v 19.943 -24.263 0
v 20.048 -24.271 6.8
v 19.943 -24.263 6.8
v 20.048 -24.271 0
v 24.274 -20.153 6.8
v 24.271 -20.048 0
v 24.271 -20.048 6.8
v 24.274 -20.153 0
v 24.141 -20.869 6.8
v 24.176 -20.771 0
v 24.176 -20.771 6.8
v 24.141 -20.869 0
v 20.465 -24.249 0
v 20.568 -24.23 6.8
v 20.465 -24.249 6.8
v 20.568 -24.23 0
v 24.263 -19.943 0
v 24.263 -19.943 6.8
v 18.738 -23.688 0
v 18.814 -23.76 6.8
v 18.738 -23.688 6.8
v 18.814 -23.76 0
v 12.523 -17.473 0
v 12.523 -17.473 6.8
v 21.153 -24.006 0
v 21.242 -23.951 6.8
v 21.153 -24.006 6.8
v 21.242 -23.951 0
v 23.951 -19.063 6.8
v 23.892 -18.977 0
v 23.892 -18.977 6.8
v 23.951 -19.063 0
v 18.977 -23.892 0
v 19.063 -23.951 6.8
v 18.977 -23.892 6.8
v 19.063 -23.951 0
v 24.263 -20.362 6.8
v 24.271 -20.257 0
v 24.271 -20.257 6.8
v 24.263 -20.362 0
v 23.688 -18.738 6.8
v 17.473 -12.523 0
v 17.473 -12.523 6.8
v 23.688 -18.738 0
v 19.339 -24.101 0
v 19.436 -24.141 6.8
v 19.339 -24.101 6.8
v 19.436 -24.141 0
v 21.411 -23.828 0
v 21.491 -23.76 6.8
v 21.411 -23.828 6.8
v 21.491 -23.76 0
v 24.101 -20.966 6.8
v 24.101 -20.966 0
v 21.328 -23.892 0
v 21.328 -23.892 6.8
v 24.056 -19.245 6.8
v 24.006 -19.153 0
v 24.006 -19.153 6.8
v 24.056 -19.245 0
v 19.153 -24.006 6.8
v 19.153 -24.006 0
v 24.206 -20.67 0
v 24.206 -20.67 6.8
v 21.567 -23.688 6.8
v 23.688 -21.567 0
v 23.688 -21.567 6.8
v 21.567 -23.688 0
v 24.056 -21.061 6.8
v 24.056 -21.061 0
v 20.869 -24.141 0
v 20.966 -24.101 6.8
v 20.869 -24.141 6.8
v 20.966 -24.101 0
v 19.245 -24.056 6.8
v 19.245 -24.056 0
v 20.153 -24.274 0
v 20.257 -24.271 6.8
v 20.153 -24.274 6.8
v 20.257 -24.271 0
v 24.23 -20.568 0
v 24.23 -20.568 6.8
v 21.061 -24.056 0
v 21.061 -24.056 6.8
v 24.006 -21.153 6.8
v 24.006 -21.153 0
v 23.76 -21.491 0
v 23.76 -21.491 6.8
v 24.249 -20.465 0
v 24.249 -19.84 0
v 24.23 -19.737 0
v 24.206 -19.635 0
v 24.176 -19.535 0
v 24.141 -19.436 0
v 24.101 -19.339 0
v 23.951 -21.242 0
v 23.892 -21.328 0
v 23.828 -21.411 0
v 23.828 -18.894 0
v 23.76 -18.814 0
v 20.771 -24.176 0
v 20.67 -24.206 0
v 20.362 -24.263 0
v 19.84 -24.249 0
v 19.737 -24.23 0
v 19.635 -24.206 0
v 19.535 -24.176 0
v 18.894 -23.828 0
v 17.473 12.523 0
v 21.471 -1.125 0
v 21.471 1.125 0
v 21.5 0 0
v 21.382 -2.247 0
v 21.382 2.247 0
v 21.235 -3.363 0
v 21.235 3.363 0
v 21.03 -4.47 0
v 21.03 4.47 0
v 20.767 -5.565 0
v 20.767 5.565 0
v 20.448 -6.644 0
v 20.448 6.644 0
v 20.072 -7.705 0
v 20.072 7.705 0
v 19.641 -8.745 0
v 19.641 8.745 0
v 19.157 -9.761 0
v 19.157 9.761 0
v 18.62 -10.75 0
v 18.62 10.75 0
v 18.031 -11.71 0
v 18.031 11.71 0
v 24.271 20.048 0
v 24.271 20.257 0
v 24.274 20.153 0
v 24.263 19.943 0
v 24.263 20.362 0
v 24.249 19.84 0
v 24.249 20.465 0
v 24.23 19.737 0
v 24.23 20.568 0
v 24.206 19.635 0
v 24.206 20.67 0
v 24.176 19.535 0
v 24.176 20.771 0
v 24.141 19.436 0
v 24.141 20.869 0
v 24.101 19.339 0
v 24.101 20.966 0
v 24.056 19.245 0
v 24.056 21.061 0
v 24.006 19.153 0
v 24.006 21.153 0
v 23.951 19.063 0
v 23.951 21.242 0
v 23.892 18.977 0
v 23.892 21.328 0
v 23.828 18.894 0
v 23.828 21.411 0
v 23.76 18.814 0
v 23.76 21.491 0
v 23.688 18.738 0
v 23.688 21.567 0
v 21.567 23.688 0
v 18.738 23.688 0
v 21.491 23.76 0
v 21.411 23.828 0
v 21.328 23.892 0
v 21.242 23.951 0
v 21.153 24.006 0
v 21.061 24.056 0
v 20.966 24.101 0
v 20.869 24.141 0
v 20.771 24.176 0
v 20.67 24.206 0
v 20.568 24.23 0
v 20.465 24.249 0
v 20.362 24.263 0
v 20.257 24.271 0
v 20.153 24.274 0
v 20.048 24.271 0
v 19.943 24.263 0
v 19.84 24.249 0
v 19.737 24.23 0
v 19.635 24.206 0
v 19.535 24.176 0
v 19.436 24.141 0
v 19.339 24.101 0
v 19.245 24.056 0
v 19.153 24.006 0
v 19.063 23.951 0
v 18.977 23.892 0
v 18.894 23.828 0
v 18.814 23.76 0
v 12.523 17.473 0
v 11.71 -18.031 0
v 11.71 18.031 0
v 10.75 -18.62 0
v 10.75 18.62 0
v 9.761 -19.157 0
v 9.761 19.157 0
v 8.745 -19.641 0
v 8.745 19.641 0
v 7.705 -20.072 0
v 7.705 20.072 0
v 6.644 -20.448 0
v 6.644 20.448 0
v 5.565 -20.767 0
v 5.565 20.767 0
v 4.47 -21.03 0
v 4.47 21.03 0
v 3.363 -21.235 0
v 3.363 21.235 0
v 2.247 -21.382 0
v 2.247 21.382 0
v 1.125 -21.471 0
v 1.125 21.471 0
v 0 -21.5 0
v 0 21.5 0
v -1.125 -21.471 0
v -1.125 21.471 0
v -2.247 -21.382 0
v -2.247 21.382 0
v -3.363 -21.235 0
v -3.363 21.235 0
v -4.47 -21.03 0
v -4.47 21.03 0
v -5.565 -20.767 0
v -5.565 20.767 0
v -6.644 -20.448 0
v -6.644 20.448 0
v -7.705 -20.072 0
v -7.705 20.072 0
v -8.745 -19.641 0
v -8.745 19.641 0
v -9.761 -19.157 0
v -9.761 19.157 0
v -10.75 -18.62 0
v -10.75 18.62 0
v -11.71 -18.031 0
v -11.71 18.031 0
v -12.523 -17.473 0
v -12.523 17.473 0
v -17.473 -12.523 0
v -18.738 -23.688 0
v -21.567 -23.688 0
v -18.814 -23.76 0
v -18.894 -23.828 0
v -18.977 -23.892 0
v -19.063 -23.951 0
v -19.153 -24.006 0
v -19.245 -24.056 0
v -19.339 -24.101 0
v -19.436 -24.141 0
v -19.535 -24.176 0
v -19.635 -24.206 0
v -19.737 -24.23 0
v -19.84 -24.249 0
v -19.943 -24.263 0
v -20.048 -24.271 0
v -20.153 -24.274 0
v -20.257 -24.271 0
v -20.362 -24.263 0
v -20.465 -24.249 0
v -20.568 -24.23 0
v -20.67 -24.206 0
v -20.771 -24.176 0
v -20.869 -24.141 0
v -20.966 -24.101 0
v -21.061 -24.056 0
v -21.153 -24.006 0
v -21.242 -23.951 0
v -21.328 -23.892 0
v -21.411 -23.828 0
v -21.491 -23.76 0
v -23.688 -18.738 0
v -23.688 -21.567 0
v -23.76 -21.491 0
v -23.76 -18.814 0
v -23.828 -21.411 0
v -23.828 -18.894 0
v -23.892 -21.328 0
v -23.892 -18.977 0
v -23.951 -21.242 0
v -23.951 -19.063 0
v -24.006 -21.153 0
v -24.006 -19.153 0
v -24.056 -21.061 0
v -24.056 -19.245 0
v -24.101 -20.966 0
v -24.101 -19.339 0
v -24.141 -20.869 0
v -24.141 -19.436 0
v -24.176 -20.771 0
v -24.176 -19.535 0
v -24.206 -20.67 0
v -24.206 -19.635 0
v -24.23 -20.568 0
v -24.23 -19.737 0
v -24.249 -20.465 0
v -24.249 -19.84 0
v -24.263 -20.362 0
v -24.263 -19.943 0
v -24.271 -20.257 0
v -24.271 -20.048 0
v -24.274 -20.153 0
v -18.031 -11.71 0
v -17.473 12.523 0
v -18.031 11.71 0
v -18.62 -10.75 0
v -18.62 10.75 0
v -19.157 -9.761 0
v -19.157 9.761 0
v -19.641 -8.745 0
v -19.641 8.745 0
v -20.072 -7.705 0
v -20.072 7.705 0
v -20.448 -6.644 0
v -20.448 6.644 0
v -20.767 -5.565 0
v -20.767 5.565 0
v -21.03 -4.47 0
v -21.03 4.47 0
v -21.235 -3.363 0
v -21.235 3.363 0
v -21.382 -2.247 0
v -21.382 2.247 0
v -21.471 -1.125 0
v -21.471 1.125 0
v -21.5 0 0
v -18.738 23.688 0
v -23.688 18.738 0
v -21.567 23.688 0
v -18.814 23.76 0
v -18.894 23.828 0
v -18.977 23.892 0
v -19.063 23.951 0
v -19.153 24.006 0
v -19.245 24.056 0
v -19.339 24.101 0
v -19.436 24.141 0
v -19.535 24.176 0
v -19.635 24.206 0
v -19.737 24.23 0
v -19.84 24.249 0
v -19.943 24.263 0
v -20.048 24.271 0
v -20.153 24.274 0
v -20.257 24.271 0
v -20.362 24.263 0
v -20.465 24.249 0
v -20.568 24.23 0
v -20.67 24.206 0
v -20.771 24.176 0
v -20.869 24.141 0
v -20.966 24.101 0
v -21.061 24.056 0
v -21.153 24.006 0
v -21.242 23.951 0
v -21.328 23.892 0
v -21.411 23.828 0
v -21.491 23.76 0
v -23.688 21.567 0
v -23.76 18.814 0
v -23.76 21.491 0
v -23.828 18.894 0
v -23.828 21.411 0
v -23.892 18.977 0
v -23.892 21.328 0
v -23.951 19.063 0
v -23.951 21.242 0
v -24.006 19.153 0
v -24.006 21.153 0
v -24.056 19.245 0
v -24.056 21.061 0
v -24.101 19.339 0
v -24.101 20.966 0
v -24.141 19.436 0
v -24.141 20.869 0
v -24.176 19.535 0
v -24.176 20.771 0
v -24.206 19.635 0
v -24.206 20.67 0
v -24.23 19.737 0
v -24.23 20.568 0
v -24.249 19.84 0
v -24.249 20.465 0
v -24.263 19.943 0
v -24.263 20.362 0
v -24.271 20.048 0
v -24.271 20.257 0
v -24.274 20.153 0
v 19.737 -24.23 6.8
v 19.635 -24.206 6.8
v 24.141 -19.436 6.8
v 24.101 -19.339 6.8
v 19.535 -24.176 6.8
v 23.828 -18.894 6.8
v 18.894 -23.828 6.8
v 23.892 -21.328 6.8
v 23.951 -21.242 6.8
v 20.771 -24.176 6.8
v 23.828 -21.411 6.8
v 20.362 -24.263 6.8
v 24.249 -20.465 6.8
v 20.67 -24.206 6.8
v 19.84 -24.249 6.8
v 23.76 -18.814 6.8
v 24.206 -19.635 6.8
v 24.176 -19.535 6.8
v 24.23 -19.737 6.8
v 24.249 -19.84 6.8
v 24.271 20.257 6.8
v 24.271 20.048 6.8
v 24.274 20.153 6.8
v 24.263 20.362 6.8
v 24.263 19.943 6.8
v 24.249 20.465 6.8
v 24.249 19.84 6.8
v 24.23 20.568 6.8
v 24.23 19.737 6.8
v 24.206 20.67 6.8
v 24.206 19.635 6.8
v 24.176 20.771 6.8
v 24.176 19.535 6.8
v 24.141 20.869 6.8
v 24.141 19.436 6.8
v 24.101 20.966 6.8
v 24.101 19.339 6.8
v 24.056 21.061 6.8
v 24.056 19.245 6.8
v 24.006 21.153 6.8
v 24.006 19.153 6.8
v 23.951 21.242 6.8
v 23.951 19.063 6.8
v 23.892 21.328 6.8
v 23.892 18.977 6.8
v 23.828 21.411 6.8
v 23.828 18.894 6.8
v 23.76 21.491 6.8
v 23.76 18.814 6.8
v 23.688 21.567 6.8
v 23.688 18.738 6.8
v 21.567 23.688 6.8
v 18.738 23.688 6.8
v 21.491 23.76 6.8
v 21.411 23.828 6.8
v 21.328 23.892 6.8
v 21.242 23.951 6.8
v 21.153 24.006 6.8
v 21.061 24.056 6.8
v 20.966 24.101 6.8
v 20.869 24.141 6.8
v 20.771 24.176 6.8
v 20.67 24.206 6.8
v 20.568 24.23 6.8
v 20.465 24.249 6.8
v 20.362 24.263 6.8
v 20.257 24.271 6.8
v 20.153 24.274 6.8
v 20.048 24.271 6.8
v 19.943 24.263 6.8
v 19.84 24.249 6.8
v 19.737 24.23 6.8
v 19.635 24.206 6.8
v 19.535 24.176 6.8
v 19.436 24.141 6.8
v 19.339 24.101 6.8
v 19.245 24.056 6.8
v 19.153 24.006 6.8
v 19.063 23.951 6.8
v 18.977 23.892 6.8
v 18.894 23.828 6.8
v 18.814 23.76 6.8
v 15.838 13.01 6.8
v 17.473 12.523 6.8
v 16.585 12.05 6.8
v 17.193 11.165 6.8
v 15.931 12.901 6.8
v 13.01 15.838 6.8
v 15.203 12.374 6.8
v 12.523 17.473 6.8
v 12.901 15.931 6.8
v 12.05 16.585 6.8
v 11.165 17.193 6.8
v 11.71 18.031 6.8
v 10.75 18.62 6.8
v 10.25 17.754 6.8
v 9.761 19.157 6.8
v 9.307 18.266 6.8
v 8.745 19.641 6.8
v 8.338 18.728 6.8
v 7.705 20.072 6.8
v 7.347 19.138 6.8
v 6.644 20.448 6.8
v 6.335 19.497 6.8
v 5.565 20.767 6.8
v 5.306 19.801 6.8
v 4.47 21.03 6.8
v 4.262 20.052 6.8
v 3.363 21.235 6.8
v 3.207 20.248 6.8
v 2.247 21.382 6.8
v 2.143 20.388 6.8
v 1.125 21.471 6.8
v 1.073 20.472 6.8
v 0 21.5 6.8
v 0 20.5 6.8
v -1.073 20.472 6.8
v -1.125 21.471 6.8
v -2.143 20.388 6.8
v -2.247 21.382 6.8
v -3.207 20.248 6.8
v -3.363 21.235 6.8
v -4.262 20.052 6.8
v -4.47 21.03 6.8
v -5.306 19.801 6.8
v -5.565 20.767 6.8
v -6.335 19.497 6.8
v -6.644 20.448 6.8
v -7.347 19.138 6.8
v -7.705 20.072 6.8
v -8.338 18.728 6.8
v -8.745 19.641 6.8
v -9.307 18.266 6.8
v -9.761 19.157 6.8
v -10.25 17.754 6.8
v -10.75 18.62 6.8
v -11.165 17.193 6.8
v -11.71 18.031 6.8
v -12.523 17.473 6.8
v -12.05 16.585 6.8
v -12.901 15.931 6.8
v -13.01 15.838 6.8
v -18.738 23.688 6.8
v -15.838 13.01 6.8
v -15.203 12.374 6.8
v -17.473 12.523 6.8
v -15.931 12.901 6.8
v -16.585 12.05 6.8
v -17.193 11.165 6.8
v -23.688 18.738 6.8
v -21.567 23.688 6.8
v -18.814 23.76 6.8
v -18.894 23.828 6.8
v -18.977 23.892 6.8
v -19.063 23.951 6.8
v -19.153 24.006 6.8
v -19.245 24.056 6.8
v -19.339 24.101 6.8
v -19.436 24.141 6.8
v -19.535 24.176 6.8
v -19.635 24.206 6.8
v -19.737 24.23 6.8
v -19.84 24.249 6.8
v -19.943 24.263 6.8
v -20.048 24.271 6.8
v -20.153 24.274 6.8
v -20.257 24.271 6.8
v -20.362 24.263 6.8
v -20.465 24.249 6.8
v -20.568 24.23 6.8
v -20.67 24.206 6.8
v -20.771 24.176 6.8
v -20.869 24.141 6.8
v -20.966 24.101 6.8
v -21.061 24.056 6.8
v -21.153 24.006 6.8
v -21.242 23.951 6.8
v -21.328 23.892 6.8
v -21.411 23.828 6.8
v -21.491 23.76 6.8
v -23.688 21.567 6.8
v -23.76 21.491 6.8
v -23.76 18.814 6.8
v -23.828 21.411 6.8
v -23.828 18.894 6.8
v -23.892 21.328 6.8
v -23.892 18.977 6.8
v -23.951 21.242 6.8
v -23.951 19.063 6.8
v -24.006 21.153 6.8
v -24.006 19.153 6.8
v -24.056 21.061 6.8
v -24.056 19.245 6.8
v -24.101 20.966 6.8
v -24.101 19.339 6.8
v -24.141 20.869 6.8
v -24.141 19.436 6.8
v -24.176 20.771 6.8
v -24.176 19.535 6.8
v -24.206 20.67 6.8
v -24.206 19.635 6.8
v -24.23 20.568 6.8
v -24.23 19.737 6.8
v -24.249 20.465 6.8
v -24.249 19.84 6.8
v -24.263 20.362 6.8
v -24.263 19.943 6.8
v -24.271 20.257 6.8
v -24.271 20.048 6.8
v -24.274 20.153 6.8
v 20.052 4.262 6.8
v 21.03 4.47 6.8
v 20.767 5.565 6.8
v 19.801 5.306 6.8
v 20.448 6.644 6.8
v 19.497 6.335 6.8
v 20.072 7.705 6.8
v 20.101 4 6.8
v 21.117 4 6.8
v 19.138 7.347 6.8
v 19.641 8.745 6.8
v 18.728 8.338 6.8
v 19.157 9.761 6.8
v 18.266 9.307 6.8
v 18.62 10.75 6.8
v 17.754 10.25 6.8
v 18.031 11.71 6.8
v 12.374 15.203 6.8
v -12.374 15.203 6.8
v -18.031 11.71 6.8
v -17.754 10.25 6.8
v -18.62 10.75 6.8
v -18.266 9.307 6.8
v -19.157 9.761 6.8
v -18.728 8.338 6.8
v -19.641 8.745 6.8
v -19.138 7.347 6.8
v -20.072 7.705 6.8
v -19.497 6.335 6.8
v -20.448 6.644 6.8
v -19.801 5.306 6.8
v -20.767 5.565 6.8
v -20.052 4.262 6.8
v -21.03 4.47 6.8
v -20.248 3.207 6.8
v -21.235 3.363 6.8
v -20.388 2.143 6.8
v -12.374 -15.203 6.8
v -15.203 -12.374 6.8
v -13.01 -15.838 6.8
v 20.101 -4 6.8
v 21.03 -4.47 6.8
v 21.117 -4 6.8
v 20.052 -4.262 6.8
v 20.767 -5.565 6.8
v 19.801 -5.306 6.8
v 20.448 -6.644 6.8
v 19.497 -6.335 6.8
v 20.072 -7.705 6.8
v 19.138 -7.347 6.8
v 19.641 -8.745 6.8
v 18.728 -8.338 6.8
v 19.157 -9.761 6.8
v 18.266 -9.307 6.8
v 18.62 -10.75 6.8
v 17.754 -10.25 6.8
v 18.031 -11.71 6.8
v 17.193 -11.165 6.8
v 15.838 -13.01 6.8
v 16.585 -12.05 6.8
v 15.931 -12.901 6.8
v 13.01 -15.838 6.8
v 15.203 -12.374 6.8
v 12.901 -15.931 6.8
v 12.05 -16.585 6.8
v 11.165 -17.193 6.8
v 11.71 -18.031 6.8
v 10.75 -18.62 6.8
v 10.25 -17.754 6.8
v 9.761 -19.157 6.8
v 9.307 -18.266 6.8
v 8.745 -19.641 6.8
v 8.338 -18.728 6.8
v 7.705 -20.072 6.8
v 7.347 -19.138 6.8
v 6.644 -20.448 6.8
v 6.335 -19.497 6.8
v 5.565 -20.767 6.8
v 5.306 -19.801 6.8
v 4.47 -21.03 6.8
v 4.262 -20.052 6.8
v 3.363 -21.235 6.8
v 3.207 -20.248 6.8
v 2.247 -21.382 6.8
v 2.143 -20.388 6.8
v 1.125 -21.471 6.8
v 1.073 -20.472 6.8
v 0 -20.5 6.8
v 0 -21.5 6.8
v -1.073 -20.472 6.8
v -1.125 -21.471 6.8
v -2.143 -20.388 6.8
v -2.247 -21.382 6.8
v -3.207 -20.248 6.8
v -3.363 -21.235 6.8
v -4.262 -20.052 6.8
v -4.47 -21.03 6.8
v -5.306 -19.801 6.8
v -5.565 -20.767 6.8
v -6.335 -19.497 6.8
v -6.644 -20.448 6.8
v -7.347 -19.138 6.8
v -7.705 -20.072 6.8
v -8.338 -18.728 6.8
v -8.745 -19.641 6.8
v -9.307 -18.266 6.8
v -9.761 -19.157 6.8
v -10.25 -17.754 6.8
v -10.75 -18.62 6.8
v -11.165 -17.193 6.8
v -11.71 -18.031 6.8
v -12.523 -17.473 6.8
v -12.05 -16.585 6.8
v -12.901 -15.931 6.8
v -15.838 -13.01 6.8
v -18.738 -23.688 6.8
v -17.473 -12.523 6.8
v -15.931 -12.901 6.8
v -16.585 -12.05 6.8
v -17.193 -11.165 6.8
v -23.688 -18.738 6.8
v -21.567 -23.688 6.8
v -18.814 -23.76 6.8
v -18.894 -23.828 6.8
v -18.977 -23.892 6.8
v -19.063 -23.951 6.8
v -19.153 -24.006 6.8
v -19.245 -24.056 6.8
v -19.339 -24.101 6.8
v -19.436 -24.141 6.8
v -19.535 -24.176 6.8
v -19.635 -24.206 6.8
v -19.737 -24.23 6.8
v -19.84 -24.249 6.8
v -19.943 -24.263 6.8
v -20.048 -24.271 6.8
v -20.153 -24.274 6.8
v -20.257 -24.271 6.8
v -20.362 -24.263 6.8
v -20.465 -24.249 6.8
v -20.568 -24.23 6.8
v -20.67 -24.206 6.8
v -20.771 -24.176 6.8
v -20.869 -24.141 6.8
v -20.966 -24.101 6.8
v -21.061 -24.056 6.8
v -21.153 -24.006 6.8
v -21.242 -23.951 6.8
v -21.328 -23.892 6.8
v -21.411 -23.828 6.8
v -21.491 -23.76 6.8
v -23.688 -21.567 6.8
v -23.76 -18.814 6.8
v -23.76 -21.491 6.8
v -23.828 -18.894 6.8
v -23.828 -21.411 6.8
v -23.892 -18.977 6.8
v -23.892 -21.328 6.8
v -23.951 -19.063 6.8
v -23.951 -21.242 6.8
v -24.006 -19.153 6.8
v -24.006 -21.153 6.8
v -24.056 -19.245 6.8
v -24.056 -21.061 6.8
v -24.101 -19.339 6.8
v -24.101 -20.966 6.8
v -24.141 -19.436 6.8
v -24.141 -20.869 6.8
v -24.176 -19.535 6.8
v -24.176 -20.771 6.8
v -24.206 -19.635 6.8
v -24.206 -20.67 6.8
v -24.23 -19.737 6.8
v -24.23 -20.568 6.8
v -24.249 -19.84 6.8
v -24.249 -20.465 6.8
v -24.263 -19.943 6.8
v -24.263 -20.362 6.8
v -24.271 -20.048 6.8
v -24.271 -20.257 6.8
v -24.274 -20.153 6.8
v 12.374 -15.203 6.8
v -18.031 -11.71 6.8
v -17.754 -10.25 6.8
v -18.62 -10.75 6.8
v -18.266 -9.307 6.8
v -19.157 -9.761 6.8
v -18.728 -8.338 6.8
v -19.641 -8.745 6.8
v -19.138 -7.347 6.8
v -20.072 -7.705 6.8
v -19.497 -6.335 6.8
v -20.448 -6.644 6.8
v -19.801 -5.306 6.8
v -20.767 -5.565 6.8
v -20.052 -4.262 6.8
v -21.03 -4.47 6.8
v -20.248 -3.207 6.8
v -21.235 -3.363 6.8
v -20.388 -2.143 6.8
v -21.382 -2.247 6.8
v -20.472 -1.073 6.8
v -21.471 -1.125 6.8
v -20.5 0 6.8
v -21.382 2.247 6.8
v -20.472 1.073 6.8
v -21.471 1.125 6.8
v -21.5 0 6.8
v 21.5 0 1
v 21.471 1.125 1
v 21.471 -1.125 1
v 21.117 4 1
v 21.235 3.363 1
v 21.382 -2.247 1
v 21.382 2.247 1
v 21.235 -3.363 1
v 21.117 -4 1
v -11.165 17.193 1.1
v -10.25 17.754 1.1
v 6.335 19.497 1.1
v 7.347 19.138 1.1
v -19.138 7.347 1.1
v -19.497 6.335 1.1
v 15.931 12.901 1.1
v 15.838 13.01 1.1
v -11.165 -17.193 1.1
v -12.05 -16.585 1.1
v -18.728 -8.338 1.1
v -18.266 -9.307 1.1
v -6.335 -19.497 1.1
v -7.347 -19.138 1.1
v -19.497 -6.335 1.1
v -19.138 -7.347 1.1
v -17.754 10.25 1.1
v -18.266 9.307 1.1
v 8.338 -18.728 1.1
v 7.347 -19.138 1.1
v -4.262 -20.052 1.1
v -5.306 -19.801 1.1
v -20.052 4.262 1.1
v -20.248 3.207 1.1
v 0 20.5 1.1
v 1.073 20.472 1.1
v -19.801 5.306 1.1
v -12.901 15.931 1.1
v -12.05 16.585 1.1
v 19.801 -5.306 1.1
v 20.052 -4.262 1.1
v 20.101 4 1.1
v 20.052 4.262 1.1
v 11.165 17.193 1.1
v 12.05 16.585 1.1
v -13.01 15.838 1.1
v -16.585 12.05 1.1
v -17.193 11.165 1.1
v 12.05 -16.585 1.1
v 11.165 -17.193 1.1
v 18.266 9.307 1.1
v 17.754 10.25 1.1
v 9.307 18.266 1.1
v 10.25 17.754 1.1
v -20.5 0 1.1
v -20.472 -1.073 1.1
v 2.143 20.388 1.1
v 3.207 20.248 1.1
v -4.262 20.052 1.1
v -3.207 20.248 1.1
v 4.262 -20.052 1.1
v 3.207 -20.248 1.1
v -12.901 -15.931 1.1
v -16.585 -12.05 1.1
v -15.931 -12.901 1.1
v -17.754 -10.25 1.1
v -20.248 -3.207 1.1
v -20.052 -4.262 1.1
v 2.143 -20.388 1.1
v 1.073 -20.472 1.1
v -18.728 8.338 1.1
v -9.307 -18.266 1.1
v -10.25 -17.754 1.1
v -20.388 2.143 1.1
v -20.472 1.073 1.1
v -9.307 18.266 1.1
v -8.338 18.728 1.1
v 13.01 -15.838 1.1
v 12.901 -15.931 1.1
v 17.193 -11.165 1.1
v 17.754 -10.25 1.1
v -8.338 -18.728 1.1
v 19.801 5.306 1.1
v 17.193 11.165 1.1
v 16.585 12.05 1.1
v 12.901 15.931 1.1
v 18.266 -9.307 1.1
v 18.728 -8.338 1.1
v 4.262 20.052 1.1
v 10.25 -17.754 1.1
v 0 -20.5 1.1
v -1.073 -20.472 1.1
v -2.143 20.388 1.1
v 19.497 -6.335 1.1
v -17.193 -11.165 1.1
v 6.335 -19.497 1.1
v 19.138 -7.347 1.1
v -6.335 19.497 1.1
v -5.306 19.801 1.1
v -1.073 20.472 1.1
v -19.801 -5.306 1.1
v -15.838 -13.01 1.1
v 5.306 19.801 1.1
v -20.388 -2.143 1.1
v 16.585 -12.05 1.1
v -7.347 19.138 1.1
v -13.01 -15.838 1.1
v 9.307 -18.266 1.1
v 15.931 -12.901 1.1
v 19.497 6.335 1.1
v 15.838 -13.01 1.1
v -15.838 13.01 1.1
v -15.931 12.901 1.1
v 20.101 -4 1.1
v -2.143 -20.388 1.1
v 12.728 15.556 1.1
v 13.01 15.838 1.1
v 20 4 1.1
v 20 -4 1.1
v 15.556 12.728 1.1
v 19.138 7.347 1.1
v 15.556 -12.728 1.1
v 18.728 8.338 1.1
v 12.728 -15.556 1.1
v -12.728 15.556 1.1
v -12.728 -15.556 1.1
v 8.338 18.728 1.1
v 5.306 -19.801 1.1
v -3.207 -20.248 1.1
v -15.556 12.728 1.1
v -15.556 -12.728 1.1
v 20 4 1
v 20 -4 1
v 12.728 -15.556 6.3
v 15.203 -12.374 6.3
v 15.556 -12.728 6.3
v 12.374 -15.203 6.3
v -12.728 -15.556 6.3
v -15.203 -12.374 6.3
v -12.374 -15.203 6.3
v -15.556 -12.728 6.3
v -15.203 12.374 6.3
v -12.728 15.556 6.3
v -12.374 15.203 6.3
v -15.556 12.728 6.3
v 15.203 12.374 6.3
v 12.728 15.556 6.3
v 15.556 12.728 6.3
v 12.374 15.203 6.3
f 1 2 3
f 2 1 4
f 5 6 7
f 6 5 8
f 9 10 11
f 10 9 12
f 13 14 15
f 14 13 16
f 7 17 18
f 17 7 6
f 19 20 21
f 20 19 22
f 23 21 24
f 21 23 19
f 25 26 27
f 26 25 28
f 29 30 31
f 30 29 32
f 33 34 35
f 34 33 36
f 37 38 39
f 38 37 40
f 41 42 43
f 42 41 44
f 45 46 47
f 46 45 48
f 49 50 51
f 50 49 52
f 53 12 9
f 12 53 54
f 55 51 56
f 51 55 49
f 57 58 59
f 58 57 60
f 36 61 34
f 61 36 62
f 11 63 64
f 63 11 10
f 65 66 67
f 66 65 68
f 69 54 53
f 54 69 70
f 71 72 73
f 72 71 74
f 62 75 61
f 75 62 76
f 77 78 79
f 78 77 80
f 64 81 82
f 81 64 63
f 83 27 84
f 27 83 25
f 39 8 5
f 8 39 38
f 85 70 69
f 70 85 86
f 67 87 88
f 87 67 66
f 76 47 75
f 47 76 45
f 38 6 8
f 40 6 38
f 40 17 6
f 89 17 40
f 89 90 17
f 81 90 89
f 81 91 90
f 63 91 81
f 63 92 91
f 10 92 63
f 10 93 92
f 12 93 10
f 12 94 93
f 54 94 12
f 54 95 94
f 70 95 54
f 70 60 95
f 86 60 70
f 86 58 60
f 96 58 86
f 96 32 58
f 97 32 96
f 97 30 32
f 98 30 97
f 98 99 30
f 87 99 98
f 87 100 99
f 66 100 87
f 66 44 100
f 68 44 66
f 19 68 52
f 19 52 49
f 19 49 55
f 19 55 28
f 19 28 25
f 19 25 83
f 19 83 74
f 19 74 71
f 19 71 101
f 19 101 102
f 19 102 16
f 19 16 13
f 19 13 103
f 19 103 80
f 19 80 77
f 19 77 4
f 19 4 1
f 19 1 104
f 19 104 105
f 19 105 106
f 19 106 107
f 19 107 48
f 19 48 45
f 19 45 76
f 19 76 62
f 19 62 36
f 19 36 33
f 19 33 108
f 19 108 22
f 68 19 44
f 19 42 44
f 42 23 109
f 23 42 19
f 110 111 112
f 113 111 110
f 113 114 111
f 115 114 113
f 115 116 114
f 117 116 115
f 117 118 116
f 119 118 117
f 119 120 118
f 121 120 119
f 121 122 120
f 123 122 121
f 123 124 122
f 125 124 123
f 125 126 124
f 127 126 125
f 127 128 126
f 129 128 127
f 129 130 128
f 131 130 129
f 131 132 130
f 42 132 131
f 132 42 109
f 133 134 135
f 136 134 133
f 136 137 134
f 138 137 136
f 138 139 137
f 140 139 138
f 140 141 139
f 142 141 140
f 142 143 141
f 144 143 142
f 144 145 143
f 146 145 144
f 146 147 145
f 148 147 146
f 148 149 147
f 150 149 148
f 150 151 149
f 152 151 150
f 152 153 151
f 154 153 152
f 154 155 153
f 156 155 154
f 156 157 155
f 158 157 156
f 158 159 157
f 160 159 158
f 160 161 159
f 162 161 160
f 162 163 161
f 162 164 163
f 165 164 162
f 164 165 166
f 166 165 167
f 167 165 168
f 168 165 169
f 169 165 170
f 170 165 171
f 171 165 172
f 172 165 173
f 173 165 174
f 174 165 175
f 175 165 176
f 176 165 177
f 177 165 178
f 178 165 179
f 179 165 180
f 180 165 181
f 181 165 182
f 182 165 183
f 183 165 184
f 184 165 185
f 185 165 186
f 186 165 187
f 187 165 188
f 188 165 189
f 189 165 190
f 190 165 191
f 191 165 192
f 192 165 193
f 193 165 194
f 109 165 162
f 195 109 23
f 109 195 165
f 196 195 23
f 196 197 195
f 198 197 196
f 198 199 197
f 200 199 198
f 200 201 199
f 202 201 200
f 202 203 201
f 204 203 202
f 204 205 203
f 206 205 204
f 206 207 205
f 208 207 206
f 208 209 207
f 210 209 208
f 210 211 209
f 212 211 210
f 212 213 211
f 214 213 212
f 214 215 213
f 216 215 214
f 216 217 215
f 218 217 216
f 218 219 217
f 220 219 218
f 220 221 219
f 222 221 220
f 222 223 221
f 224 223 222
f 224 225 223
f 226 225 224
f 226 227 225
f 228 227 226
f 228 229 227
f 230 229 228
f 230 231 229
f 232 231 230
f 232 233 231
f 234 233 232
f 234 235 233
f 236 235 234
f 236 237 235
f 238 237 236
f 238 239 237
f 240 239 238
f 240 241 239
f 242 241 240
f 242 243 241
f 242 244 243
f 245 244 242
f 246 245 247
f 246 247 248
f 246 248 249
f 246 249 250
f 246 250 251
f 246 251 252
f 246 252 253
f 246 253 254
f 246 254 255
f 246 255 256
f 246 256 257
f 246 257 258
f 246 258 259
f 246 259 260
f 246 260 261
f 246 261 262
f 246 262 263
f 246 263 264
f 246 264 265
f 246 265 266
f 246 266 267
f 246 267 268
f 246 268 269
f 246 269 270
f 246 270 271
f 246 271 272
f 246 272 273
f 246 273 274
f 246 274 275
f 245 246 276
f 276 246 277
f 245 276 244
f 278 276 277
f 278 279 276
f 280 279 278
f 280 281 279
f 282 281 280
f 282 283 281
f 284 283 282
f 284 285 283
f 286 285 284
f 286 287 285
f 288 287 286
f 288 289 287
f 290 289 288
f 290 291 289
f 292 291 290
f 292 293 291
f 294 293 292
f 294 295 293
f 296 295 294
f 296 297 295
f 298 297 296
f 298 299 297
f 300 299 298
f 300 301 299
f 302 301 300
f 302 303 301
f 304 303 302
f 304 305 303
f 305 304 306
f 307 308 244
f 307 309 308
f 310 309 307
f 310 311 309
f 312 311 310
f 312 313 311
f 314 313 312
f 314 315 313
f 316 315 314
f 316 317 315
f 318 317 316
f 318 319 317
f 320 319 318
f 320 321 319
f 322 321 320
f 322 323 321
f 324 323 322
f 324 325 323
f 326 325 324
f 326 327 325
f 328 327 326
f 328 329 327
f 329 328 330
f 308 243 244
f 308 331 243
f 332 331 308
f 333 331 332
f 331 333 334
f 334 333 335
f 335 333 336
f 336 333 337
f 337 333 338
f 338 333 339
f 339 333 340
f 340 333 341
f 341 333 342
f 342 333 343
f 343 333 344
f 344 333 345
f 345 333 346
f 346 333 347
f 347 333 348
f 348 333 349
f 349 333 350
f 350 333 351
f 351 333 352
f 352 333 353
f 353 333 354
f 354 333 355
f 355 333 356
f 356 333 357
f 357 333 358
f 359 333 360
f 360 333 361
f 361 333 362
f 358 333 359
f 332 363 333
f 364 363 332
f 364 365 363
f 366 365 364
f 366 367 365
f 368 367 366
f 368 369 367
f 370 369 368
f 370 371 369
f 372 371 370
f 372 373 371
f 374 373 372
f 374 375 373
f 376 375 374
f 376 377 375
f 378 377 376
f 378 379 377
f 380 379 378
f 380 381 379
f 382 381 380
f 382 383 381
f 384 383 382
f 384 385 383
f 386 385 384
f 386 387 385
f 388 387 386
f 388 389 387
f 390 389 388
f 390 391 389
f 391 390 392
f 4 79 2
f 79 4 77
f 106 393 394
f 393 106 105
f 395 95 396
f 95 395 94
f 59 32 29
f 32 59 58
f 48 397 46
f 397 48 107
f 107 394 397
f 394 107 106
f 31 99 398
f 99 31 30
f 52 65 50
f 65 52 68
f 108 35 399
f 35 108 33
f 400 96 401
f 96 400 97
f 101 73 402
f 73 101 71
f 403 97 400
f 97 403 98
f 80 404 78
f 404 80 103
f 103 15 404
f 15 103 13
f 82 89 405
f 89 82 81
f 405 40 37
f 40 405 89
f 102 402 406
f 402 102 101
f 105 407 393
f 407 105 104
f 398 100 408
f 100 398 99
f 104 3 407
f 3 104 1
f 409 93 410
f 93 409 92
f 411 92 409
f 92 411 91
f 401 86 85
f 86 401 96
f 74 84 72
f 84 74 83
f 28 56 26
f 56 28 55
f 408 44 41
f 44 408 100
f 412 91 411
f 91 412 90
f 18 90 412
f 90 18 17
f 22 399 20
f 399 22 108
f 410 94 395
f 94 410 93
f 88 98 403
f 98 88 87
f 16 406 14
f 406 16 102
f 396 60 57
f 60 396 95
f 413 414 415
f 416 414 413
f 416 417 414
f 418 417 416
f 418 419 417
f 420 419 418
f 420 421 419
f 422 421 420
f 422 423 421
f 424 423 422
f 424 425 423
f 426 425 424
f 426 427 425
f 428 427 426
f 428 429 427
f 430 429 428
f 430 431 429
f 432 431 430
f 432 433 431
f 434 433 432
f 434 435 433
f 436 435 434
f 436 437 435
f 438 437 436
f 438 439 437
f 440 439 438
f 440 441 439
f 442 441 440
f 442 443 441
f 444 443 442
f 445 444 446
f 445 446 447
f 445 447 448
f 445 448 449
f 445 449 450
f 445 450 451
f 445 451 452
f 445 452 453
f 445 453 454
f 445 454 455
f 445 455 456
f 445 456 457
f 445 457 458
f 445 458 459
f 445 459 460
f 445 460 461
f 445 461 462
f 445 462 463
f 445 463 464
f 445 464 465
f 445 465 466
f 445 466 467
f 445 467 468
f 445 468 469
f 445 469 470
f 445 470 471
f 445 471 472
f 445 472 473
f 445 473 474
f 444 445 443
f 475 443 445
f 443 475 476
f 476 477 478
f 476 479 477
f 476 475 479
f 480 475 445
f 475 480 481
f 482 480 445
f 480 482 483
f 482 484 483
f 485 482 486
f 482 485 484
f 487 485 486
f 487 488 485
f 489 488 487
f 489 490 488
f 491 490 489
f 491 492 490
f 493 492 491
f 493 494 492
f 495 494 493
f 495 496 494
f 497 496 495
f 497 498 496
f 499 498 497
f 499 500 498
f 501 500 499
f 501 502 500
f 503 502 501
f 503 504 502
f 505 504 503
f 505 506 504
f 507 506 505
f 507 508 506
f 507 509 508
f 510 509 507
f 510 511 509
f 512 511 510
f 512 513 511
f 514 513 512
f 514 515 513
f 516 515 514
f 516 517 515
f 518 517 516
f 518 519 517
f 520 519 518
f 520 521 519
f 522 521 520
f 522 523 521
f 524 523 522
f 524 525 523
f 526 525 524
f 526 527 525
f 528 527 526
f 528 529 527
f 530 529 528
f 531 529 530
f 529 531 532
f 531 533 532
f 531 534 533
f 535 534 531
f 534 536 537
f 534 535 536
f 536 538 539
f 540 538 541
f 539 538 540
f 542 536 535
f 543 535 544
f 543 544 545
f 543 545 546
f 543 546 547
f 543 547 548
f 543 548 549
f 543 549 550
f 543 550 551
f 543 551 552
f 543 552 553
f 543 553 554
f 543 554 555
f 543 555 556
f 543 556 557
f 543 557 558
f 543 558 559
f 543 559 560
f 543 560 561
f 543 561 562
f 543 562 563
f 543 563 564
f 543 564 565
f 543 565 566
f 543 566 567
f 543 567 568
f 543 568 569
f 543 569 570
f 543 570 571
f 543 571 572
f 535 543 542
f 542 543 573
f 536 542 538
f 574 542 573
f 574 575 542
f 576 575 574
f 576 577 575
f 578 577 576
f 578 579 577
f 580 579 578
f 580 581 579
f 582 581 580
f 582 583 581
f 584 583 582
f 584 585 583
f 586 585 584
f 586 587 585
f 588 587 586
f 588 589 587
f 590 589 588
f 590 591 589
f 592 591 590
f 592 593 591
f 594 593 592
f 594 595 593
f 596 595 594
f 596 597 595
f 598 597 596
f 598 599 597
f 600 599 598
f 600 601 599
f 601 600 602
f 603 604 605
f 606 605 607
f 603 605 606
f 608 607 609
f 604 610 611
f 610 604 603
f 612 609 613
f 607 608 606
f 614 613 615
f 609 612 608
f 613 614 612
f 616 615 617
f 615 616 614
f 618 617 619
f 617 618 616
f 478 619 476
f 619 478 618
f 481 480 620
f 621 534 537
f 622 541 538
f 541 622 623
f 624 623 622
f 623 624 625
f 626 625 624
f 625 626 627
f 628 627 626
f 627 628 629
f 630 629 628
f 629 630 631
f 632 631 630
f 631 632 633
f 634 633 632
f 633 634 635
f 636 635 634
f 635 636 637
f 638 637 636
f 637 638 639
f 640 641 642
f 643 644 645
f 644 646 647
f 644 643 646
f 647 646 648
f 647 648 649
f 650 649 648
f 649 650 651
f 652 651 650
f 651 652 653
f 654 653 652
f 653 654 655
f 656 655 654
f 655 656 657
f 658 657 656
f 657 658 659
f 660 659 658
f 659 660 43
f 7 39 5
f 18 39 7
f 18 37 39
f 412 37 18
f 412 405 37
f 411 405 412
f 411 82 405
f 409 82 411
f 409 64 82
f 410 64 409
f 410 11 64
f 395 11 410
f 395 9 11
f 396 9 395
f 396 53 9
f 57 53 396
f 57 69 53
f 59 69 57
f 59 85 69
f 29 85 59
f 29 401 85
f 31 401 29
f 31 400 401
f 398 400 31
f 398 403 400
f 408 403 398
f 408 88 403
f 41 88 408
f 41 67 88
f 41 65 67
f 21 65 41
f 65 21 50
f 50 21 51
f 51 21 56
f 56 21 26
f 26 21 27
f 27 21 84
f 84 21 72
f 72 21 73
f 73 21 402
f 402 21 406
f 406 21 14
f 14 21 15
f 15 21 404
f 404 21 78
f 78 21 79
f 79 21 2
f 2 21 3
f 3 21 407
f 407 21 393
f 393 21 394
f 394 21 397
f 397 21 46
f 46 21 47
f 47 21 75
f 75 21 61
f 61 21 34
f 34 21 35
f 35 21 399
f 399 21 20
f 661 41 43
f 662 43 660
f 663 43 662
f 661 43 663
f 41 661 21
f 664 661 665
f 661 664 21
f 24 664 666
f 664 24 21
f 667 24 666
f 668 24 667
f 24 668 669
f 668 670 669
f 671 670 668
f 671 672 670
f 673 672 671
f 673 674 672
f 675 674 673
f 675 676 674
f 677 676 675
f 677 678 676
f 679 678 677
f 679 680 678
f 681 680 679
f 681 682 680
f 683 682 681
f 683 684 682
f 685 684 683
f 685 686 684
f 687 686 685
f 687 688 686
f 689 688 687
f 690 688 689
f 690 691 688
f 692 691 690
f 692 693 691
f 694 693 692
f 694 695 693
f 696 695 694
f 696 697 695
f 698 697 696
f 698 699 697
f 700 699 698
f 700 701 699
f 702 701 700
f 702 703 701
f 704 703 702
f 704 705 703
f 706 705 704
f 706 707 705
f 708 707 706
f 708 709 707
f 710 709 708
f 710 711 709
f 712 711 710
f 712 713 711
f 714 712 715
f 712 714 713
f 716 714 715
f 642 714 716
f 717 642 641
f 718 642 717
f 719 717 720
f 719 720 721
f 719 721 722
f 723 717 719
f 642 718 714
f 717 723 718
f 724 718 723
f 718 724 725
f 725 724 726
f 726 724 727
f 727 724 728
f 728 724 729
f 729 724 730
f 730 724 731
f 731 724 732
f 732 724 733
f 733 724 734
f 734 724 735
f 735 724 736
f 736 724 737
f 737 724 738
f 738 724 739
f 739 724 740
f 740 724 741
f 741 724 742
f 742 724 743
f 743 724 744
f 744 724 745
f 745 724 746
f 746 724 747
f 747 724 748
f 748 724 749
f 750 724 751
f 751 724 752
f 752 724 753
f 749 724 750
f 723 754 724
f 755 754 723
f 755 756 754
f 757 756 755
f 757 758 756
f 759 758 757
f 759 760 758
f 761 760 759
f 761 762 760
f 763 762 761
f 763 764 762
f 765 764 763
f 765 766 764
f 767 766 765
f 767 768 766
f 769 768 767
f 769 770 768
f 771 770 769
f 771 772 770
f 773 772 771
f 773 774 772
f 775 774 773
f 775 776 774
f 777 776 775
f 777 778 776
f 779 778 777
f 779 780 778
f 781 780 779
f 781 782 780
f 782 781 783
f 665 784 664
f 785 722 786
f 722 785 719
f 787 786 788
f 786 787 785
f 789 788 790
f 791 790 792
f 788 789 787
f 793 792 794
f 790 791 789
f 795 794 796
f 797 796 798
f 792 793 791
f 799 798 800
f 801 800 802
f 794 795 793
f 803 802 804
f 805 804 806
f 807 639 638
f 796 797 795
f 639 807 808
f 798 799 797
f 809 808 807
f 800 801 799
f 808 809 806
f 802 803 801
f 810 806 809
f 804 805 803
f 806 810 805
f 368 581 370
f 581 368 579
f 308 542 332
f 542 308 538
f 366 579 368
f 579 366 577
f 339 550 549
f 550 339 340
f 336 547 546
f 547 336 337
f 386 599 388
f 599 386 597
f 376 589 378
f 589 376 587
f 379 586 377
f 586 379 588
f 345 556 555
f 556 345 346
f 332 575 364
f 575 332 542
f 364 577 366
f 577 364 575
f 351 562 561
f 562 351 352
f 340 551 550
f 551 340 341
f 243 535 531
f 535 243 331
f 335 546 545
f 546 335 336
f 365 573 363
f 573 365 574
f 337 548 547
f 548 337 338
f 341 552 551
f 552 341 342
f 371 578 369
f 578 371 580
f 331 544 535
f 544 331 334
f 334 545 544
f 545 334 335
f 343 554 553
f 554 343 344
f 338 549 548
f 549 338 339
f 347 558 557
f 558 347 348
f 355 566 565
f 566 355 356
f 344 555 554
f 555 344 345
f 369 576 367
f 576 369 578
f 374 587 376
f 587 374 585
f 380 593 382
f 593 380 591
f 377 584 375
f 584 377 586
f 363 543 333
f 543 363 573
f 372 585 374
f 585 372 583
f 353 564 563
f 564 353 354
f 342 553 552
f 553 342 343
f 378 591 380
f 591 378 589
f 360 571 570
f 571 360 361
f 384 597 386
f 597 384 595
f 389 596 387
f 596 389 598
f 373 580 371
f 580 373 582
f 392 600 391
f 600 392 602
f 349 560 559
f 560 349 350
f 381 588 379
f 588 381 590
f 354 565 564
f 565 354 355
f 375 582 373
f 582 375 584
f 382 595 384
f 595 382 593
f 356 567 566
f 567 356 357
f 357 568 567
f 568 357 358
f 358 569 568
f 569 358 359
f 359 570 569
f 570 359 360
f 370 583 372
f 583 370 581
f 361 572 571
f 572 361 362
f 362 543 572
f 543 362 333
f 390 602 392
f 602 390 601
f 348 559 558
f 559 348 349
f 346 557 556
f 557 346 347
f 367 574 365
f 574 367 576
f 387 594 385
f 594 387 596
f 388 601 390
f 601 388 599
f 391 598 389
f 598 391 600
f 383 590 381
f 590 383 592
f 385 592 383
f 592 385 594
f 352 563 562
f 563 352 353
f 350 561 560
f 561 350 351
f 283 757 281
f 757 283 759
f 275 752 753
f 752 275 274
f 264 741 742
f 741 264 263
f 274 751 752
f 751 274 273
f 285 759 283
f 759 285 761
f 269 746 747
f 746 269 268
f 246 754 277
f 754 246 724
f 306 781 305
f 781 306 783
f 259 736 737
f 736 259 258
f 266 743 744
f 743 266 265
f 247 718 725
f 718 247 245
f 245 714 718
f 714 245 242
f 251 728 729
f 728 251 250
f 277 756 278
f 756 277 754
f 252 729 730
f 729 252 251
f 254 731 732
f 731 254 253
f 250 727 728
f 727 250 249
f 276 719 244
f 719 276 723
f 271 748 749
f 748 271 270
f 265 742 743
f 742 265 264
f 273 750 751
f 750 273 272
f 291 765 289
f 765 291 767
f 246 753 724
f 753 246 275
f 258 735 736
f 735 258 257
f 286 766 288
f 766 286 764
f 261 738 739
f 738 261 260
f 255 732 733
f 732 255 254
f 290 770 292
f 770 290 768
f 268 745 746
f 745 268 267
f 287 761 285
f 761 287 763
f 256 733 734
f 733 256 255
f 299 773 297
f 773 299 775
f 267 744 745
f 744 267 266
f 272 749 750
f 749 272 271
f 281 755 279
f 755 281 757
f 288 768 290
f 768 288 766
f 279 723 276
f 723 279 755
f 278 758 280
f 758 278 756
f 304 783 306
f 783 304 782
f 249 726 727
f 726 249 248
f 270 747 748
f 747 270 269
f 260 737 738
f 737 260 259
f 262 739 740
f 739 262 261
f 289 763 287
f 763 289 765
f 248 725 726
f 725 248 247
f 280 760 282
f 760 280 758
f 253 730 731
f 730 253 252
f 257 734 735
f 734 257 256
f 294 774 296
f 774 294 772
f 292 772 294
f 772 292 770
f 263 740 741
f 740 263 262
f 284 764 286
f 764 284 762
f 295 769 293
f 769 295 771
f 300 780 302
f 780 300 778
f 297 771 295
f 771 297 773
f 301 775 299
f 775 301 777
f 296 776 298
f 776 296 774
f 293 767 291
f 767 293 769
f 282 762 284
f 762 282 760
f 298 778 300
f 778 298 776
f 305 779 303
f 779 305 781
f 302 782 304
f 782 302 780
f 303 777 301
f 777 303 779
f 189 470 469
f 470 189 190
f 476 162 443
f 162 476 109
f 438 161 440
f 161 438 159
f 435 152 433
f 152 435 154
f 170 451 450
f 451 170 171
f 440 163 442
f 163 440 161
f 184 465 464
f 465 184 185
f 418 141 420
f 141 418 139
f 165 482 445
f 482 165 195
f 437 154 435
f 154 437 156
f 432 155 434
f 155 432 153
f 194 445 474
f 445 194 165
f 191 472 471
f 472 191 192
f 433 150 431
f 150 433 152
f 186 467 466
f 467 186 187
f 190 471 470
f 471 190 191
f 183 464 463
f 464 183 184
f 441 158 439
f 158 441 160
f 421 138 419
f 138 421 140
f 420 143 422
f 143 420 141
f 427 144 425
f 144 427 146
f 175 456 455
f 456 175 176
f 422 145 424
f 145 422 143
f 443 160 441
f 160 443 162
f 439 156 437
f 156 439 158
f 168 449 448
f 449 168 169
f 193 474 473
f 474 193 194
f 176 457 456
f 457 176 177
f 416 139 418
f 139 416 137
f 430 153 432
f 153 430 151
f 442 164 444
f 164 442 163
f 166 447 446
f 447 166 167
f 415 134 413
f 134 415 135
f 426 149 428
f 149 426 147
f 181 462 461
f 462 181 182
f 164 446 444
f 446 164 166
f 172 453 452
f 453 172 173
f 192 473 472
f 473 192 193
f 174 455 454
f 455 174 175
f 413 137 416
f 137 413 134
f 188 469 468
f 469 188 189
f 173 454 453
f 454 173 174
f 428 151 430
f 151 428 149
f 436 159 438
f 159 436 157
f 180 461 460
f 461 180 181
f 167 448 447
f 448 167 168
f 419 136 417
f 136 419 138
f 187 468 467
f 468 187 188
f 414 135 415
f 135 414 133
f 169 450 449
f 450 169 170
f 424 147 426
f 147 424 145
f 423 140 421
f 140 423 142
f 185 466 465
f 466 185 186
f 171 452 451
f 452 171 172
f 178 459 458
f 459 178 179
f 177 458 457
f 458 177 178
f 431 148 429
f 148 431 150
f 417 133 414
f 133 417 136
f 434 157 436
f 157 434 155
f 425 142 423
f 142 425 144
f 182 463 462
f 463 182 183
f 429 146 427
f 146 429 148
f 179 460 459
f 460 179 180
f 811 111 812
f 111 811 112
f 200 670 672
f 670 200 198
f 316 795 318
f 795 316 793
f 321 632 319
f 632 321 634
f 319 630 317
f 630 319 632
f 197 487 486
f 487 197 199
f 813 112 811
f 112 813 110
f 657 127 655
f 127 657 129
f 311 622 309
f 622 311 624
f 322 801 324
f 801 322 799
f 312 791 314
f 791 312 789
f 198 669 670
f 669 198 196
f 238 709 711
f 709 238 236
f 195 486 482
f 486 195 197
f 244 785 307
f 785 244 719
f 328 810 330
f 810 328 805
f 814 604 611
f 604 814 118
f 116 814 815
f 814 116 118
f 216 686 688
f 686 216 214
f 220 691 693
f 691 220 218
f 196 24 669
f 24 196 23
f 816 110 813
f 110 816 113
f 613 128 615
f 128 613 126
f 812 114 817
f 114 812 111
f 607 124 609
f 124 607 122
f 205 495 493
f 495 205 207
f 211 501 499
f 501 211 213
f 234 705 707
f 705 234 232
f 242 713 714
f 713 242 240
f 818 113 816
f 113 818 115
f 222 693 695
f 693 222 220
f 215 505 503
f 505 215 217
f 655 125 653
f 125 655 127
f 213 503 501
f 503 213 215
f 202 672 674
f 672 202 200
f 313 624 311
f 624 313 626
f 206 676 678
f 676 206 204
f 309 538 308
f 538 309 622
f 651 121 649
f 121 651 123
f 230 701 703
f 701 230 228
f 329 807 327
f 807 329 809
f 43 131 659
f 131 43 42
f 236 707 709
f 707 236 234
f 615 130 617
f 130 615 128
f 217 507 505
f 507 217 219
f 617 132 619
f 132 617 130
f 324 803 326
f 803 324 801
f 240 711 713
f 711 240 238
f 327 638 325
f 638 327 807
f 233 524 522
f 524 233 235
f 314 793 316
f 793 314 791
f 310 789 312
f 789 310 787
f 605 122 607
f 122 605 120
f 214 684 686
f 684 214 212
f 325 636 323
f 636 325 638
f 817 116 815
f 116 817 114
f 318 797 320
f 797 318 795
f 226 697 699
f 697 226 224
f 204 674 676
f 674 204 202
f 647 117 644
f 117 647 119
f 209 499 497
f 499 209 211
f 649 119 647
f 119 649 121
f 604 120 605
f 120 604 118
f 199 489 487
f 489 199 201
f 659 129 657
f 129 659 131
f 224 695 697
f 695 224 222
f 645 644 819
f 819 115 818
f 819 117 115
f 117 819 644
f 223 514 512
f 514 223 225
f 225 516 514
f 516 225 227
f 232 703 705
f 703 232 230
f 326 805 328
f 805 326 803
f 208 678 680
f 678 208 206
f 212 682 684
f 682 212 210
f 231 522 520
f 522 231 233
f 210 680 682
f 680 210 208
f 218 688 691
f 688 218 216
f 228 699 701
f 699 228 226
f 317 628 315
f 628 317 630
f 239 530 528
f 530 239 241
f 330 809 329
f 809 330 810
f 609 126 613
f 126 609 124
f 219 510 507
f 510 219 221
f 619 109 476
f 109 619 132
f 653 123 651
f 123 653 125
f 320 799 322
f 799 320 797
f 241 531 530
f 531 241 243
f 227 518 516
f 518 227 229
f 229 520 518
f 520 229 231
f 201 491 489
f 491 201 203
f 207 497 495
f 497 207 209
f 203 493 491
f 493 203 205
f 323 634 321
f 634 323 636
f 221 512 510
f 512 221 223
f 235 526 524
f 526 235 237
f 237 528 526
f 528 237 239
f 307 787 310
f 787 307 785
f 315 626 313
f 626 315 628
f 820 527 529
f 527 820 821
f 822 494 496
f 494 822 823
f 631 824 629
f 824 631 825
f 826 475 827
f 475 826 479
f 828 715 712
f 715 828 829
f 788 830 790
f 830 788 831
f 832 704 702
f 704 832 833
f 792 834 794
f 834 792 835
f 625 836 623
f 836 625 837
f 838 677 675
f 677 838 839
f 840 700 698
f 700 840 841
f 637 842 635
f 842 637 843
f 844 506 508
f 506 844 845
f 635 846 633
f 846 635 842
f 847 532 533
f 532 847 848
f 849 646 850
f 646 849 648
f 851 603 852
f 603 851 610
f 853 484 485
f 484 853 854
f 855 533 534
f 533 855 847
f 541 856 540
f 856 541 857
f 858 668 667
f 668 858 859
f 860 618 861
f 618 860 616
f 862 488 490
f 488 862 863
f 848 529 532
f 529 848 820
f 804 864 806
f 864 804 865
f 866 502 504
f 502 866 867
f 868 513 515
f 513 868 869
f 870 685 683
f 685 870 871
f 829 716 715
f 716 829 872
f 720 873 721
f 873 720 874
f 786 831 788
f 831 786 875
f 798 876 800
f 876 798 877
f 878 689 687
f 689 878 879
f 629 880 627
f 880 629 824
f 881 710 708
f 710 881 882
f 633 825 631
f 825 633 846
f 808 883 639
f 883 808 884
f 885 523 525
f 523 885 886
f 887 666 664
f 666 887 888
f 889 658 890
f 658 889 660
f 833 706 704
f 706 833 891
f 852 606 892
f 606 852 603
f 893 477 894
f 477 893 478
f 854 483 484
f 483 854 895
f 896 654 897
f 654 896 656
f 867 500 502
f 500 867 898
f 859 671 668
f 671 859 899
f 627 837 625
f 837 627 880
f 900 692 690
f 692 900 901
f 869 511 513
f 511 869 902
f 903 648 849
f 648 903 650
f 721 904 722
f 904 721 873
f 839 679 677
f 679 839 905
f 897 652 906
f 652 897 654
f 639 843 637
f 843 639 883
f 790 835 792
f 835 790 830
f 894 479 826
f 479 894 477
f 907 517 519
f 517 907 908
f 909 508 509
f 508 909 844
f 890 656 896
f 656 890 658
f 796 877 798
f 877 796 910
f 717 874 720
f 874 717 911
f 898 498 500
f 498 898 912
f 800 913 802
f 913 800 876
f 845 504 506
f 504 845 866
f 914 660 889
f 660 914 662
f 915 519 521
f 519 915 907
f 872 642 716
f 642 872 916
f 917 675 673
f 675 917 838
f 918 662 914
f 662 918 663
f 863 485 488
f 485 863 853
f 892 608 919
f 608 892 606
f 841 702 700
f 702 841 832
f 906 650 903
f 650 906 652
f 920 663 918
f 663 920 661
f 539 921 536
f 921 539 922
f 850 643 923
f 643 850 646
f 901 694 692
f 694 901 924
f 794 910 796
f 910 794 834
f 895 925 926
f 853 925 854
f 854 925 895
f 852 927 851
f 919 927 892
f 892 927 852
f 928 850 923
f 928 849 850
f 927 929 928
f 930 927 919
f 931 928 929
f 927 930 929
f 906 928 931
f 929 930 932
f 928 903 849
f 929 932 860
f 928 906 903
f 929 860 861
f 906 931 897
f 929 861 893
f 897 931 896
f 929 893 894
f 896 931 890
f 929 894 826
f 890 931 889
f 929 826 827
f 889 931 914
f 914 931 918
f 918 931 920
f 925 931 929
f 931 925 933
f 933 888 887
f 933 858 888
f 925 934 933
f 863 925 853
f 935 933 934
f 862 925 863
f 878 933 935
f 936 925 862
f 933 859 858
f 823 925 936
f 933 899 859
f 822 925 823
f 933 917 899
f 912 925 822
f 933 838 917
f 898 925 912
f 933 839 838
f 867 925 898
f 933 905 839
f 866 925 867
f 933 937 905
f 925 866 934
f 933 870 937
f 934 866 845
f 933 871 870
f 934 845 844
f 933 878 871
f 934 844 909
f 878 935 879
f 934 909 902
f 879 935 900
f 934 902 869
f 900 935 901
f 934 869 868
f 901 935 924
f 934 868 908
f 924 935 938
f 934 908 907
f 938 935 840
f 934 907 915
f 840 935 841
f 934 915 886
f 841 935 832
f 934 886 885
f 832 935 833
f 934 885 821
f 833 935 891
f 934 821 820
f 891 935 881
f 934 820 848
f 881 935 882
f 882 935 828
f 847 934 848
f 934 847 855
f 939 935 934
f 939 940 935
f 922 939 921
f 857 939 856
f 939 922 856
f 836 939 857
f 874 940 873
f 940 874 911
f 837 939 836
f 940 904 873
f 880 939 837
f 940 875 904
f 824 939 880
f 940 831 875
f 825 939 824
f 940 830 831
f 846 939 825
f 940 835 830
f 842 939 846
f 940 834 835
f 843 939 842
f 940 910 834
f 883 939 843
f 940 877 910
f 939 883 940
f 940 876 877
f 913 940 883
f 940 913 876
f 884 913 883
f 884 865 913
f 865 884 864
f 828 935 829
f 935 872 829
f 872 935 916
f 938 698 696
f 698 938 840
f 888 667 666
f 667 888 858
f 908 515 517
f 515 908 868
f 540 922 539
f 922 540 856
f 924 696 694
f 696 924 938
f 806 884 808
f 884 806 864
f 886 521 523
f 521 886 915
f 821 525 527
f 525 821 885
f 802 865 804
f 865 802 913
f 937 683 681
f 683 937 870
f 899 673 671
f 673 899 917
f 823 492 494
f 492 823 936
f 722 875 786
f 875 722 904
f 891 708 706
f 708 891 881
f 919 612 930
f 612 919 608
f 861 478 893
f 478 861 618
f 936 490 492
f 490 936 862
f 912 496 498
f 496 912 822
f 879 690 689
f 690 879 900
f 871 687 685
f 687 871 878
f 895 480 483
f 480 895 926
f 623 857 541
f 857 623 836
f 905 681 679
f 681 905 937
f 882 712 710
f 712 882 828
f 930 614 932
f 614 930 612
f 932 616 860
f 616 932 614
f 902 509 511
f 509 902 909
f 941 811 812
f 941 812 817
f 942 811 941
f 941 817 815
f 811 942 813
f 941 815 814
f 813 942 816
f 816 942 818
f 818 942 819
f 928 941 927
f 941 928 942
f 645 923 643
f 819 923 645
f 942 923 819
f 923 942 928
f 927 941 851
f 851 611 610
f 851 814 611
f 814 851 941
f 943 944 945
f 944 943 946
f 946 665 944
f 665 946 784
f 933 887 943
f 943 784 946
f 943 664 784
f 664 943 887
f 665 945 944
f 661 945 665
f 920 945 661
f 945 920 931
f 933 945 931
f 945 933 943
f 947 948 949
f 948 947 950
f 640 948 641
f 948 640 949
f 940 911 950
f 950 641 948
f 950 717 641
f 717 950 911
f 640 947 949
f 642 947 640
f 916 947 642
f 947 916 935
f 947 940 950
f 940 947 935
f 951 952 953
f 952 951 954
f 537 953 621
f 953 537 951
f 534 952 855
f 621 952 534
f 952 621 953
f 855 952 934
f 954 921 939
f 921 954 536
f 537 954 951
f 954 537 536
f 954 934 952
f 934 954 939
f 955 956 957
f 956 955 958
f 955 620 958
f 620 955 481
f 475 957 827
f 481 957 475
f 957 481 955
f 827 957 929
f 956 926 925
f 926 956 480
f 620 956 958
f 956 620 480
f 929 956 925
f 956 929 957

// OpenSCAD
// Copyright 2015 Steve Pomeroy
// Licensed under the CC-BY-SA 4.0 License
// http://creativecommons.org/licenses/by-sa/4.0/

//////////////////////////////////////////////////////////////////////
/////////////////////// Configuration Options ////////////////////////
//////////////////////////////////////////////////////////////////////
// tidy up the curves
$fn=120;
$fs=0.5;

// measured dimensions of the pebblebee
pebblebee=[40,40,5.8];

// wall thickness
wall=1;

// radius of the crossbars
curve_r=2;

// the crossbars to wind your cord around
bar=[3,60,pebblebee[2]];

// the bit that touches the actual pebblebee
spacer=[0.5,4,pebblebee[2]];

// A small clip above the spacer to hold the pebblebee in
clip=[0.5 + spacer[0],4,0.5];

// hole for accessing the button
button=8;

//////////////////////////////////////////////////////////////////////
//////////////////////////////////////////////////////////////////////

translate([0,0,pebblebee[2]+wall])
  rotate([180,0,0]) {
    difference(){
      union() {
        minkowski(){

        union(){
        rotate([0,0,-45])
            translate([-bar[0]/2,-bar[1]/2,0])
                cube(bar);

        rotate([0,0,45])
            translate([-bar[0]/2,-bar[1]/2,0])
                cube(bar);
        }

        cylinder(r=curve_r,h=wall);
        }

        cylinder(r=pebblebee[0]/2+wall+spacer[0],h=pebblebee[2]+wall);
      }
        // Hole for pebblebee + spacer
        translate([0,0,-0.1])
          cylinder(r=pebblebee[0]/2 + spacer[0],h=pebblebee[2]);
      // notch for the button + to remove the Pebblebee
      translate([pebblebee[0]/2,-button/2,-0.1])
      cube([wall*2,button,pebblebee[2]+0.1]);
    }

    for (rot = [45 : 90 : 360]) {
      rotate([0,0,rot]) {
        translate([pebblebee[0]/2-clip[0]+spacer[0],-clip[1]/2,0])
          cube(clip);

        translate([pebblebee[0]/2,-spacer[1]/2,0])
          cube(spacer);
      }
    }
}
